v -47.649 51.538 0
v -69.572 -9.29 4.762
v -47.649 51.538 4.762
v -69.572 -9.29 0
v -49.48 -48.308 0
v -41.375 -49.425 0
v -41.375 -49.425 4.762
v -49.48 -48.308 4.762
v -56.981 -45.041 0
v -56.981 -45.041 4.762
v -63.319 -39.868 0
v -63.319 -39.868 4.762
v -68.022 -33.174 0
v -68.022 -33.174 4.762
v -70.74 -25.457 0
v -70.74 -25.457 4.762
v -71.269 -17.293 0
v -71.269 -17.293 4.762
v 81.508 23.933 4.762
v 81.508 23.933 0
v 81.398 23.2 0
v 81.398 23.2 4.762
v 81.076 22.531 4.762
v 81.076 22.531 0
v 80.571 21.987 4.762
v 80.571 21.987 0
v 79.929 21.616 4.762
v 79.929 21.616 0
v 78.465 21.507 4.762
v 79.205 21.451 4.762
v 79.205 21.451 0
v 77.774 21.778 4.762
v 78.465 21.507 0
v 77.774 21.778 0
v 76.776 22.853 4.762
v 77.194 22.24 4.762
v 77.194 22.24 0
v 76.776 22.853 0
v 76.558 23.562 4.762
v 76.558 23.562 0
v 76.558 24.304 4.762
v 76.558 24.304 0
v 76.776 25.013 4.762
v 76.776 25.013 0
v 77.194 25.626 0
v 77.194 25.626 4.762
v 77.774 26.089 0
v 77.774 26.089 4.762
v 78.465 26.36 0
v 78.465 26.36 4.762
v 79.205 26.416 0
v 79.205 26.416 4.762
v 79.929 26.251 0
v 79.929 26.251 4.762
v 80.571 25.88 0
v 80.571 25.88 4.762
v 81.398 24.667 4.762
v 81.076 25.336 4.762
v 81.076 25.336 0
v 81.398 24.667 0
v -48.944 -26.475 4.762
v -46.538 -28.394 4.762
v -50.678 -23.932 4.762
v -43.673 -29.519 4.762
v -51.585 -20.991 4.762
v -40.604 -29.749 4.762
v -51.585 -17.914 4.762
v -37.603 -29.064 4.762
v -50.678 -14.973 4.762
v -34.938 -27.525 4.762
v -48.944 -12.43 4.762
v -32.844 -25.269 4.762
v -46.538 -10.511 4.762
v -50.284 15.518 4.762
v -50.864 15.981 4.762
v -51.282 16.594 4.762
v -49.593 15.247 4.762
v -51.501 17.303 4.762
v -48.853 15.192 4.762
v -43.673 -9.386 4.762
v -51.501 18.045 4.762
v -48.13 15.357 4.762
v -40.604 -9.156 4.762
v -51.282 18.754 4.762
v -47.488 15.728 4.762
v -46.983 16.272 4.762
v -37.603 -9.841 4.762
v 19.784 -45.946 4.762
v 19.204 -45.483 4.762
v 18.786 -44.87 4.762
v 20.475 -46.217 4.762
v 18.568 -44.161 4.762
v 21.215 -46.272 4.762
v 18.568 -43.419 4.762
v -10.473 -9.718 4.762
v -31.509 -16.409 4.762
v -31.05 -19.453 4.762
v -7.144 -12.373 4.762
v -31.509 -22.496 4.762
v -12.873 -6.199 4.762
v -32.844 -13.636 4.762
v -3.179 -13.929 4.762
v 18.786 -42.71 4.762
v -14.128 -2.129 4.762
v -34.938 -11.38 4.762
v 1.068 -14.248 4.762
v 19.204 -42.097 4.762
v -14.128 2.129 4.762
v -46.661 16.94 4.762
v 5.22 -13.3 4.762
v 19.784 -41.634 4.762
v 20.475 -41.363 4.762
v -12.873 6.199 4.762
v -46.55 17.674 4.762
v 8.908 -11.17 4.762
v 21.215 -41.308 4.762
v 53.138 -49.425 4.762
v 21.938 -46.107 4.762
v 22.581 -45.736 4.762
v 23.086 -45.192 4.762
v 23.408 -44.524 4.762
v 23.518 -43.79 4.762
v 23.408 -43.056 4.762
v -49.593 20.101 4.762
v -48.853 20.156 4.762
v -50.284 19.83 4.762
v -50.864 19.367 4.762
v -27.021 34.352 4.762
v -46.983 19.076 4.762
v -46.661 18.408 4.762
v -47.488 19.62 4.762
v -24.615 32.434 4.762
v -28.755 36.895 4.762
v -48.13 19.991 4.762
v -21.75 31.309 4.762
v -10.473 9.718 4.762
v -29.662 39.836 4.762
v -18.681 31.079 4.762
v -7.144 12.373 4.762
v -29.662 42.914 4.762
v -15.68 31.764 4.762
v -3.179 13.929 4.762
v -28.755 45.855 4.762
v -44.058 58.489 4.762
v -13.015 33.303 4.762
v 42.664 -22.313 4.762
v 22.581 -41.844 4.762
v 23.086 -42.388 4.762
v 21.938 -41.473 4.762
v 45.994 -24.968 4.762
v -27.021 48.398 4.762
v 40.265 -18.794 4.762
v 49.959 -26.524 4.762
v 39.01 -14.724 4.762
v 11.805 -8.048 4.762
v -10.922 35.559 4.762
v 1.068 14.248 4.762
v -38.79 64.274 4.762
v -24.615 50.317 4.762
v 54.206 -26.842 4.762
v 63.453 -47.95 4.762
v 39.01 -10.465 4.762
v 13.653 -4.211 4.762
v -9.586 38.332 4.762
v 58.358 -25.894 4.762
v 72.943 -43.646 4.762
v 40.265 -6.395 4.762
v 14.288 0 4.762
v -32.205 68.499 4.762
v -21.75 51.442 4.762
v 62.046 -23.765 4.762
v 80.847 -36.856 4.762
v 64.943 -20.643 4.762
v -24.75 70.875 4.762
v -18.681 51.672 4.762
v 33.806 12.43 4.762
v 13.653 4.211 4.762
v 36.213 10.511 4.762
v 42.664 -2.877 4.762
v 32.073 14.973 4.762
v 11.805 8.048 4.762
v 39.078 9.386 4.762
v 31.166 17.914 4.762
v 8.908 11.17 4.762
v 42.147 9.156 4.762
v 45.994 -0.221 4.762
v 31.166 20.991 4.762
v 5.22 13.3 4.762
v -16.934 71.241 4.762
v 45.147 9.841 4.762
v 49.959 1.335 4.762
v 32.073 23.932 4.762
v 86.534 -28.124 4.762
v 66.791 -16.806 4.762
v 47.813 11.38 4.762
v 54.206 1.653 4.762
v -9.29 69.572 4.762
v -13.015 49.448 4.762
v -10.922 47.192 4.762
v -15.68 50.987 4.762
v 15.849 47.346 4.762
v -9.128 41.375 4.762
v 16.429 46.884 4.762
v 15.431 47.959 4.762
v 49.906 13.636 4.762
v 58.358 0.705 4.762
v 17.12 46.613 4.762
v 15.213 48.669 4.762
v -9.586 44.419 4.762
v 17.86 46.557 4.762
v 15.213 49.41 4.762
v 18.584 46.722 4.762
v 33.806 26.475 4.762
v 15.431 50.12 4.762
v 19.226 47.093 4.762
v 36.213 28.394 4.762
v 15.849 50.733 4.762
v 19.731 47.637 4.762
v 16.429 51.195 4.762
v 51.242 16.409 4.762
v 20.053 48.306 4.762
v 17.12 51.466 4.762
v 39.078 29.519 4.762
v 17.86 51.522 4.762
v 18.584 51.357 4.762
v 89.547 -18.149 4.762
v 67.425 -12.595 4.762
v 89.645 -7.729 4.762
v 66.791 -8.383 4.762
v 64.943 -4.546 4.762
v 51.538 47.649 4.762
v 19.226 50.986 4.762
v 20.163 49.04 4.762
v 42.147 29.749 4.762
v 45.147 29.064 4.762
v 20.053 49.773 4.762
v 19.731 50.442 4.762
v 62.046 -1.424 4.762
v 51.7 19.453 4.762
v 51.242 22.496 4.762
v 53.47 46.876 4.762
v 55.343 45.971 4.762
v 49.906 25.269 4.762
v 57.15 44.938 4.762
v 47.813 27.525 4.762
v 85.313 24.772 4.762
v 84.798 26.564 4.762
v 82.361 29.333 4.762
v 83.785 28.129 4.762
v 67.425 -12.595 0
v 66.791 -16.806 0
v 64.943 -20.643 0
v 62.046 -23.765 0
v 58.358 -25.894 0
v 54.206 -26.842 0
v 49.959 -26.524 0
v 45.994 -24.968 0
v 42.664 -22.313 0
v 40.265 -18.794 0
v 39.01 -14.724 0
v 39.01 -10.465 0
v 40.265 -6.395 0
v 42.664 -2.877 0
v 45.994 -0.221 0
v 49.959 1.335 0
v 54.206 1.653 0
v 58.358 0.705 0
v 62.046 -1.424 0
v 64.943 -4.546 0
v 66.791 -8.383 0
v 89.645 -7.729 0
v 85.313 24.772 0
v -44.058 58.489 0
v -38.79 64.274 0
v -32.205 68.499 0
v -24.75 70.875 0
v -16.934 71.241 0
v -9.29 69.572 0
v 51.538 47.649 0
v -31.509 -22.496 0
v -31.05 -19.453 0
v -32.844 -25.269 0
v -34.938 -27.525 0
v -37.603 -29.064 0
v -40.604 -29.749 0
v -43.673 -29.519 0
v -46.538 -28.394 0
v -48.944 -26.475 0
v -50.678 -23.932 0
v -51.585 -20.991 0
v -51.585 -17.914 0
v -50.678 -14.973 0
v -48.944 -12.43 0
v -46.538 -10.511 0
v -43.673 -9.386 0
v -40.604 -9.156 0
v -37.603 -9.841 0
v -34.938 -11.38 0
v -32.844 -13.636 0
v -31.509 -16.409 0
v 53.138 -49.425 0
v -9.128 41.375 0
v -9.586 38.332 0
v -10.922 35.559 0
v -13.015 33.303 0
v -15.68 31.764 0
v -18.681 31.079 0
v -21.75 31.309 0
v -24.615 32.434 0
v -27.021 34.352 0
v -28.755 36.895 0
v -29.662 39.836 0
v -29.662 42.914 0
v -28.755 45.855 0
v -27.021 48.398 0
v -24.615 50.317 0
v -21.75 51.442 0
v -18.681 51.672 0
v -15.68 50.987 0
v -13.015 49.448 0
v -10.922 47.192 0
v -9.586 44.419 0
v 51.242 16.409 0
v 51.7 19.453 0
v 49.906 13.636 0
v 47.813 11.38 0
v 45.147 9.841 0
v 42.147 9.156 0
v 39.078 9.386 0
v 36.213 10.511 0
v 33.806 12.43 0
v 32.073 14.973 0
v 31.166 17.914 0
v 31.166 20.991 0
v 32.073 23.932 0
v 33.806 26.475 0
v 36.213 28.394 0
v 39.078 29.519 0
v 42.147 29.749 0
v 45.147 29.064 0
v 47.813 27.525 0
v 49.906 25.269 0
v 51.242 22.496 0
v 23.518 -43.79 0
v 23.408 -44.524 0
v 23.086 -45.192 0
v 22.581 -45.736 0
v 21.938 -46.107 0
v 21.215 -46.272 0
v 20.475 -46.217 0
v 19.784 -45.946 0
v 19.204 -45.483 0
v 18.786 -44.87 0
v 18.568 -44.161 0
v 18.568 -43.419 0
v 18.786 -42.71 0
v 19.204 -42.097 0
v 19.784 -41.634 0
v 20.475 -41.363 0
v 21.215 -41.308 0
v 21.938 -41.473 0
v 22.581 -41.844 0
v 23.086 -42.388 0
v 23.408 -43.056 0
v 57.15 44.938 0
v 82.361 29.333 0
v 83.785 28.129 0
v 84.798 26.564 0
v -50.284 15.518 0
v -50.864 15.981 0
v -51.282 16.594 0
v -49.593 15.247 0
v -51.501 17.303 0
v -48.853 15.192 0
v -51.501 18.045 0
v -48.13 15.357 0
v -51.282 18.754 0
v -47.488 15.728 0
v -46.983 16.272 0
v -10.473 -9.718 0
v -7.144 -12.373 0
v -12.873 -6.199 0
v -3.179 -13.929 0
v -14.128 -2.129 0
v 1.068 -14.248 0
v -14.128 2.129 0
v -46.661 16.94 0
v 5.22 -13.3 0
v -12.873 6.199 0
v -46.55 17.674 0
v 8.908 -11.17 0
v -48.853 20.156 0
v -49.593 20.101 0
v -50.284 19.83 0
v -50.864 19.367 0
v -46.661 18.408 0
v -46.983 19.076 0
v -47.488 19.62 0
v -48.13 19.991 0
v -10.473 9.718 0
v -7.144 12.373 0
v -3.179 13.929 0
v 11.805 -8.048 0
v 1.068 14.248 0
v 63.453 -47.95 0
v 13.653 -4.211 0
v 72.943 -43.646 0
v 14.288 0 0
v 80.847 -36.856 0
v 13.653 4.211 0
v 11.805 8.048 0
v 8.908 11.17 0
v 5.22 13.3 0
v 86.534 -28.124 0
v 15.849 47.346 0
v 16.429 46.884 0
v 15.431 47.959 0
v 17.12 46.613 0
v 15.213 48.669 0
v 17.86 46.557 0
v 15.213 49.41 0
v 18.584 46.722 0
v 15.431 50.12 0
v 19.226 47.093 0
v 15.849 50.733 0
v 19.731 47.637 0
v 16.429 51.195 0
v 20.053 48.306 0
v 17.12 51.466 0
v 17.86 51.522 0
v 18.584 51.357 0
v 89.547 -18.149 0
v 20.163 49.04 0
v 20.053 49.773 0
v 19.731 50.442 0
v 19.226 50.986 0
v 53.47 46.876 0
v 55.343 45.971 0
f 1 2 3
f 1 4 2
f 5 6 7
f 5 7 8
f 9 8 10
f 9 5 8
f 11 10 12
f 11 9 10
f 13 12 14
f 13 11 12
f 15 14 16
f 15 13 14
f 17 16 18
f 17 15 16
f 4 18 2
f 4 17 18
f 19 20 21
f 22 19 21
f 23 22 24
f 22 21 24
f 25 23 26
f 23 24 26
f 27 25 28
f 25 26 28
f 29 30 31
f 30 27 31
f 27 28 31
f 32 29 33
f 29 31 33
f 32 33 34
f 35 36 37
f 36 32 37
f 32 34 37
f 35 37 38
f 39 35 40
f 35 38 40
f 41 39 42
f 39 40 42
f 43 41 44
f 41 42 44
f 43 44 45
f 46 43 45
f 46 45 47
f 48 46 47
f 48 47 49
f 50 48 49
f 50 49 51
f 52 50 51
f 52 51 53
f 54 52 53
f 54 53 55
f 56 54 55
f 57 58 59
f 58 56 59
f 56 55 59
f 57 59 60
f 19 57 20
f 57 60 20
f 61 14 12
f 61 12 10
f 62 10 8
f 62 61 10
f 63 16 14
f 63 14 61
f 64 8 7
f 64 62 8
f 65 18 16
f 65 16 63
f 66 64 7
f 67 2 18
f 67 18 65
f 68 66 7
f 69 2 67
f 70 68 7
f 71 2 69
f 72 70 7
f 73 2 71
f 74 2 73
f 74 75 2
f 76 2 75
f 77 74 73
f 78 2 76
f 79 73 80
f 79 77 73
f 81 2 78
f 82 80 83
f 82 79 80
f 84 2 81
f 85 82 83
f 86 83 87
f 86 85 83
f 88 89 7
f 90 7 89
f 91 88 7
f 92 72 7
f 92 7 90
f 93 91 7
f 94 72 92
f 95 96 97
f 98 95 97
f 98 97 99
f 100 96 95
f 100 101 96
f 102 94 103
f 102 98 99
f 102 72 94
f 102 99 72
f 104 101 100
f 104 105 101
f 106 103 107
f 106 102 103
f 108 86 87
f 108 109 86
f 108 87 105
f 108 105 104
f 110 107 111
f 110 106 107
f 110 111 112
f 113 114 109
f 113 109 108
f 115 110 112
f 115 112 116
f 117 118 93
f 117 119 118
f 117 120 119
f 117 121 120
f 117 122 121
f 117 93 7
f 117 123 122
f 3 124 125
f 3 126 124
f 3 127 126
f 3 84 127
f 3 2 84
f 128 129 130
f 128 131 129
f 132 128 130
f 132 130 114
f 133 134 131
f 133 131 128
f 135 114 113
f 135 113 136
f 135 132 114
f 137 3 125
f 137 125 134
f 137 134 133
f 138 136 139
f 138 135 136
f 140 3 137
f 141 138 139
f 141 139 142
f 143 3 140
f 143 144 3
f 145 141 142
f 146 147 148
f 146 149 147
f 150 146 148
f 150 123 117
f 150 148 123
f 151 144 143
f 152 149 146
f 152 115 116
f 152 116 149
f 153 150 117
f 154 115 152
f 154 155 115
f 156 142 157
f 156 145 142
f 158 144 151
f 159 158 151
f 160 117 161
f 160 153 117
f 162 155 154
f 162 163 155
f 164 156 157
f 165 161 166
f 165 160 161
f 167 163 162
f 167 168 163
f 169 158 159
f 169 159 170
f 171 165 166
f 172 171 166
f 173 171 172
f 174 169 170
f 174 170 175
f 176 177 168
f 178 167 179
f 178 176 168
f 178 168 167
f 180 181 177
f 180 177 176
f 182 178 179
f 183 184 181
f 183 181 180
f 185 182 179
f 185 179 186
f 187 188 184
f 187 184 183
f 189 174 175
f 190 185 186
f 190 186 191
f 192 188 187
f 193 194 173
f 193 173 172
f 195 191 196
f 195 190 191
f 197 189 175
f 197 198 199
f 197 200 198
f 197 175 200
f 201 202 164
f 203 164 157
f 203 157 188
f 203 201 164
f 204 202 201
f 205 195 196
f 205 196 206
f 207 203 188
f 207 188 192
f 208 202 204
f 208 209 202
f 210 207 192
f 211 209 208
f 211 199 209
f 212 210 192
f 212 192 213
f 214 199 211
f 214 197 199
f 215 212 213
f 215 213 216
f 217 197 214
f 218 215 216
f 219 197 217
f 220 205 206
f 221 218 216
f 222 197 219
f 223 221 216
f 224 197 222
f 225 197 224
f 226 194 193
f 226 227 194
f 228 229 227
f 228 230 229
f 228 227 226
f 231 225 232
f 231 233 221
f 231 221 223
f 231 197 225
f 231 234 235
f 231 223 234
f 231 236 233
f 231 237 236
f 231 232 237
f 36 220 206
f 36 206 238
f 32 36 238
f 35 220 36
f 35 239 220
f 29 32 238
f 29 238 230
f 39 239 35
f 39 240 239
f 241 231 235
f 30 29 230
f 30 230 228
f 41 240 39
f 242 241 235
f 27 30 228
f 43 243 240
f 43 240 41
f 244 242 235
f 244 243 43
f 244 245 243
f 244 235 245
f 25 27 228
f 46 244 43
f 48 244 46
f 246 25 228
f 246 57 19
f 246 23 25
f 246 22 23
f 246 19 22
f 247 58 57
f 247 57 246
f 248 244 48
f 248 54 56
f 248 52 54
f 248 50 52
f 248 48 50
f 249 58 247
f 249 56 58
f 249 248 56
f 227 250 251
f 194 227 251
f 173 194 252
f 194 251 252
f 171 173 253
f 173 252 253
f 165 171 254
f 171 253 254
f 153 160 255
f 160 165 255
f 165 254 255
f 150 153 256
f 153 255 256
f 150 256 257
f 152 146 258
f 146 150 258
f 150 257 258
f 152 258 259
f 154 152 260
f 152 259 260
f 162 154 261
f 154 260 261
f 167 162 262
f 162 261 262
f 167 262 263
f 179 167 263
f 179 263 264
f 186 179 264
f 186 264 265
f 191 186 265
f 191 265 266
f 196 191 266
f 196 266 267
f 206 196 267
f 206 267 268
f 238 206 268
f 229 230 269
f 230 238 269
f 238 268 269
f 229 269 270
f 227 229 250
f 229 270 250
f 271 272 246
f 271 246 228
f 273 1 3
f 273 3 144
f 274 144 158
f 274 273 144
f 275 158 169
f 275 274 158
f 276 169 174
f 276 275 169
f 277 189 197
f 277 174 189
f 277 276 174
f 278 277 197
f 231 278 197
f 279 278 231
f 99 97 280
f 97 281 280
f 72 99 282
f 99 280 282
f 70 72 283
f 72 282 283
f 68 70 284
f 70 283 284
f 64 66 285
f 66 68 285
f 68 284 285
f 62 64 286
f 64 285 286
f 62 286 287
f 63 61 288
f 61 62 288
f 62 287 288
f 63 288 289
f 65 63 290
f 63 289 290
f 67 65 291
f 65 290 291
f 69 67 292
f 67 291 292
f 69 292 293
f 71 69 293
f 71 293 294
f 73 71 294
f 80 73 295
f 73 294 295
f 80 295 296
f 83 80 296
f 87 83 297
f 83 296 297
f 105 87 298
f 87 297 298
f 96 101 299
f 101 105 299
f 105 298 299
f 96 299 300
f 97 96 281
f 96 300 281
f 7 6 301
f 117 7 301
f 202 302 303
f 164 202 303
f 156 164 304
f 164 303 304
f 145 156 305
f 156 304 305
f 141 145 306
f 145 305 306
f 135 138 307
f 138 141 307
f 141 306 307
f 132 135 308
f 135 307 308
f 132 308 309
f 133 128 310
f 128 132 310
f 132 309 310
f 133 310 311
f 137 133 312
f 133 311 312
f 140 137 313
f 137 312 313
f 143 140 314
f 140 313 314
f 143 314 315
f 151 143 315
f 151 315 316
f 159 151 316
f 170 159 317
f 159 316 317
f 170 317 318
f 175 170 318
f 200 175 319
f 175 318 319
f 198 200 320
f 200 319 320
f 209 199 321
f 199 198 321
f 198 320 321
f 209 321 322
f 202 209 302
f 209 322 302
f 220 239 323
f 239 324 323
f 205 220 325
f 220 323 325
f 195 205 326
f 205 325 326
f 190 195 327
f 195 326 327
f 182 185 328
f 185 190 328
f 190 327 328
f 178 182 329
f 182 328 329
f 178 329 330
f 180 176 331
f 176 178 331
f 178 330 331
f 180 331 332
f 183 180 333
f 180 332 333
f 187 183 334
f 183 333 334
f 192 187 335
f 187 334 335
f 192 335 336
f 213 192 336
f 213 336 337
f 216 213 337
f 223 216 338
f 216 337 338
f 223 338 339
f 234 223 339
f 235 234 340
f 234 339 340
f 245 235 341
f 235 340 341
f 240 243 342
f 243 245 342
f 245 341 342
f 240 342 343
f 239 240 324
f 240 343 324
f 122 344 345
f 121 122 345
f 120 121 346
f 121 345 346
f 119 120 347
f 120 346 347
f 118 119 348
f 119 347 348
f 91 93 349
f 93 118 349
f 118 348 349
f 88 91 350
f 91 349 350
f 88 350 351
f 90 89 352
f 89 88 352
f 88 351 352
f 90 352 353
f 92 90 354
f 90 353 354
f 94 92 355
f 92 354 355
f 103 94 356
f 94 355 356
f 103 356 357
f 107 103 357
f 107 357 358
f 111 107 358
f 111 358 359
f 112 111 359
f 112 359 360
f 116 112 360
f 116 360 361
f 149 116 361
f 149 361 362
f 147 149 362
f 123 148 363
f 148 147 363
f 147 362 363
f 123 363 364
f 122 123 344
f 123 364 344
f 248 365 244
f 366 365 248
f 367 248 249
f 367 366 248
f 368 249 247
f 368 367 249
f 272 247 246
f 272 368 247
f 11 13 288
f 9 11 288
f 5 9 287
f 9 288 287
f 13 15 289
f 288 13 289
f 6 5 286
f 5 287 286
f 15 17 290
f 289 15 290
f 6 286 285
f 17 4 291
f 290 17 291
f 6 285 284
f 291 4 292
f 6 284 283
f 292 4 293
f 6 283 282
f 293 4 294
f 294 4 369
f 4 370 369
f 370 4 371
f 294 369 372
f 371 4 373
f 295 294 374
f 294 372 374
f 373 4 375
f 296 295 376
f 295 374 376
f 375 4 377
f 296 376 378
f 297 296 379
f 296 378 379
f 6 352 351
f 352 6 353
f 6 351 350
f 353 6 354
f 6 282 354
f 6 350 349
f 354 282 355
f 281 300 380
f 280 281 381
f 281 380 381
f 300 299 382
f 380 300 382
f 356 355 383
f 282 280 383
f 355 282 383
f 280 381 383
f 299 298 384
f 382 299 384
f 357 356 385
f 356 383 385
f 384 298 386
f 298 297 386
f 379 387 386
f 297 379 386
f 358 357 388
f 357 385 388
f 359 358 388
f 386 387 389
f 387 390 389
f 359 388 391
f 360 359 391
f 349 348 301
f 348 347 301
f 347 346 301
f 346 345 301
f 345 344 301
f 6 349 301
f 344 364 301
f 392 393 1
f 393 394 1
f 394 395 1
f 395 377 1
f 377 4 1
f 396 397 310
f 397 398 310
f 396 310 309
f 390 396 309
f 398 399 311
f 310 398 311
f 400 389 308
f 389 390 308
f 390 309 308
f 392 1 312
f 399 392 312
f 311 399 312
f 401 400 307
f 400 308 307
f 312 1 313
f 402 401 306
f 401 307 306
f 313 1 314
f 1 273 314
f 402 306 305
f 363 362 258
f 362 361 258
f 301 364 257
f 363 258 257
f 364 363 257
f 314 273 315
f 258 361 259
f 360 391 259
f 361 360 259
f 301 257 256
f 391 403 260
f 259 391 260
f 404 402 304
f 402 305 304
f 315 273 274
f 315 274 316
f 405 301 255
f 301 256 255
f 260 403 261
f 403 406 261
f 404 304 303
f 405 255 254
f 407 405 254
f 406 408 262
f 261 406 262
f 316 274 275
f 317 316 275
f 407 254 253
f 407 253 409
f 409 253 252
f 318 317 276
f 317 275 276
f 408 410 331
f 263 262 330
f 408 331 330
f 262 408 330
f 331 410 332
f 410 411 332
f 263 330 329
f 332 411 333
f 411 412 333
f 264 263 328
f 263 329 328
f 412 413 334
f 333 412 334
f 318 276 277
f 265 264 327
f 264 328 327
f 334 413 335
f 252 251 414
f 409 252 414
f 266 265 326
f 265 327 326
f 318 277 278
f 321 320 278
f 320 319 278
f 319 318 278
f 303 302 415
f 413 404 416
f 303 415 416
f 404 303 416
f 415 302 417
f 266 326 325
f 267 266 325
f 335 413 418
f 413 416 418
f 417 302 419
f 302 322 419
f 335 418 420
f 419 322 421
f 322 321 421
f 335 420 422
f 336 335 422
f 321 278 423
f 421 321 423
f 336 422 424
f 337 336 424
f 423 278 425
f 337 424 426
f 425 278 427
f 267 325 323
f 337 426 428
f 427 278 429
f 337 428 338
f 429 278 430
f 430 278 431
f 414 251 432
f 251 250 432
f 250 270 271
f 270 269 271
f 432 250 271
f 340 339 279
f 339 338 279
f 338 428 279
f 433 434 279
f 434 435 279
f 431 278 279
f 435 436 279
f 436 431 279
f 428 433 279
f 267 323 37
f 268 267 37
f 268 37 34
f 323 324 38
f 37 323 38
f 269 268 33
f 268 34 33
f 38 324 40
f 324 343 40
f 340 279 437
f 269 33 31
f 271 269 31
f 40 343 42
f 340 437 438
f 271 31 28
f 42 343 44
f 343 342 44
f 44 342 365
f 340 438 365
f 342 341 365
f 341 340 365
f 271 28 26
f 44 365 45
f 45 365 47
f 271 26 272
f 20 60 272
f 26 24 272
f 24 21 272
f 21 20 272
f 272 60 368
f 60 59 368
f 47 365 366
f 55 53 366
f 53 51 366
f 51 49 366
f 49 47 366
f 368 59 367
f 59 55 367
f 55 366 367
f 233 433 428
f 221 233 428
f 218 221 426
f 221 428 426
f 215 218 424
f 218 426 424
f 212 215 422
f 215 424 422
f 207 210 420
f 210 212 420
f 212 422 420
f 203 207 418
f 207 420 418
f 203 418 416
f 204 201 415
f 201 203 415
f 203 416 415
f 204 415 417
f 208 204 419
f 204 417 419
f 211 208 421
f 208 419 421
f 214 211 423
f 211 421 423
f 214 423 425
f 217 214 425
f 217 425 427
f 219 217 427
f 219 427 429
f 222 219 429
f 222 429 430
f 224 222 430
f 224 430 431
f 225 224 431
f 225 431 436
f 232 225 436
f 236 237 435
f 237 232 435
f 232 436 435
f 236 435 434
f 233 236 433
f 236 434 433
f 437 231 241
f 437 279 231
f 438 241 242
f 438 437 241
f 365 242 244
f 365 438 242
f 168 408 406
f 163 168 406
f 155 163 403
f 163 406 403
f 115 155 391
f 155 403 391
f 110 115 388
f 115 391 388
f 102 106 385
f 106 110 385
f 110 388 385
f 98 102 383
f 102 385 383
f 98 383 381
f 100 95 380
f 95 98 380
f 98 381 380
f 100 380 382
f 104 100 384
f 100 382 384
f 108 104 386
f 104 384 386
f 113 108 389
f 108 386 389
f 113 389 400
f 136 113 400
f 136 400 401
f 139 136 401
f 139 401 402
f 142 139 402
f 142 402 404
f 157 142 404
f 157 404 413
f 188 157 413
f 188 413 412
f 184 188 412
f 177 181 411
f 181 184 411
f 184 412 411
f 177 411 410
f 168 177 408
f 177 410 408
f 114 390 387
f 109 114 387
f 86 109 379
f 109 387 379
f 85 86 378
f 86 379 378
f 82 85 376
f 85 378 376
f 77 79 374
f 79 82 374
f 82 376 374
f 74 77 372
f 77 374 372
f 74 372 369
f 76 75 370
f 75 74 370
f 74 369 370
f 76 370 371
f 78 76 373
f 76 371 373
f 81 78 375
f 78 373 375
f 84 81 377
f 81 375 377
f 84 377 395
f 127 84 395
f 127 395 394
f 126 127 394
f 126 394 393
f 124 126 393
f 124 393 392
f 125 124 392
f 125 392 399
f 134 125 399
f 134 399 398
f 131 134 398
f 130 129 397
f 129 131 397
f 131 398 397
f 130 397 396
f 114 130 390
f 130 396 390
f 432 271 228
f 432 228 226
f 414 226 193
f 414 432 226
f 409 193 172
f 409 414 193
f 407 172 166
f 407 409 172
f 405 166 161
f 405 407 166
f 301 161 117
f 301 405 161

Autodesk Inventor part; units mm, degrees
ref_plane "YZ Plane" through (0, 0, 0) normal (1, 0, 0) x (0, 1, 0)
ref_plane "XZ Plane" through (0, 0, 0) normal (0, 1, 0) x (-1, 0, 0)
ref_plane "XY Plane" through (0, 0, 0) normal (0, 0, 1) x (1, 0, 0)
sketch "Sketch1" plane through (0, 0, 0) normal (0, 0, 1) x (1, 0, 0)
  circle A0 centre (0, 0) radius 38.1 construction
  circle A1 centre (-41.3753, -19.4526) radius 7.62 construction
  circle A2 centre (-19.4526, 41.3753) radius 7.62 construction
  circle A3 centre (41.3753, 19.4526) radius 7.62 construction
  circle A4 centre (-41.3753, -19.4526) radius 29.972 construction
  circle A5 centre (-19.4526, 41.3753) radius 29.972 construction
  circle A6 centre (41.3753, 19.4526) radius 29.972 construction
  line L0 (-31.2131, 8.7441) -> (-29.6148, 13.1787) construction
  line L1 (8.7441, 31.2131) -> (13.1787, 29.6148) construction
  circle A7 centre (0, 0) radius 19.05 construction
  circle A8 centre (53.1378, -12.5946) radius 35.56 construction
  circle A9 centre (53.1378, -12.5946) radius 14.2875
  circle A10 centre (41.3753, 19.4526) radius 10.3251
  line L2 (44.9329, 9.7597) -> (48.2149, 0.818) construction
  circle A11 centre (53.1378, -12.5946) radius 36.83 construction
  line L3 (-41.3753, -49.4246) -> (53.1378, -49.4246)
  circle A12 centre (-19.4526, 41.3753) radius 10.3251
  circle A13 centre (-41.3753, -19.4526) radius 10.3251
  circle A14 centre (21.029, -43.7899) radius 6.35 construction
  circle A15 centre (0, 0) radius 40.64 construction
  line L4 (-7.2269, -37.4083) -> (-7.7087, -39.9022) construction
  circle A16 centre (21.029, -43.7899) radius 2.4892
  line L5 (18.2801, -38.0657) -> (17.5929, -36.6347) construction
  line L6 (25.5834, -39.365) -> (26.722, -38.2588) construction
  circle A17 centre (-49.0395, 17.6741) radius 6.35 construction
  circle A18 centre (-49.0395, 17.6741) radius 2.4892
  circle A19 centre (17.6741, 49.0395) radius 6.35 construction
  circle A20 centre (17.6741, 49.0395) radius 2.4892
  circle A21 centre (79.0191, 23.9334) radius 2.4892
  circle A22 centre (79.0191, 23.9334) radius 6.35 construction
  line L7 (-47.7557, 11.4552) -> (-47.4347, 9.9005) construction
  line L8 (-44.0835, 21.6442) -> (-42.8445, 22.6367) construction
  line L9 (11.4552, 47.7557) -> (9.9005, 47.4347) construction
  line L10 (21.6442, 44.0835) -> (22.6367, 42.8445) construction
  line L11 (72.7136, 23.1828) -> (71.1372, 22.9952) construction
  line L12 (75.348, 18.7521) -> (74.4302, 17.4568) construction
  line L13 (-69.5719, -9.2903) -> (-47.6492, 51.5375)
  arc A23 (-69.5719, -9.2903) -> (-41.3753, -49.4246) centre (-41.3753, -19.4526) ccw
  line L14 (-9.2903, 69.5719) -> (51.5375, 47.6492)
  arc A24 (-9.2903, 69.5719) -> (-47.6492, 51.5375) centre (-19.4526, 41.3753) ccw
  line L15 (57.1496, 44.9377) -> (82.3611, 29.3328)
  line L16 (85.3134, 24.7723) -> (89.645, -7.7291)
  arc A25 (57.1496, 44.9377) -> (51.5375, 47.6492) centre (41.3753, 19.4526) ccw
  arc A26 (85.3134, 24.7723) -> (82.3611, 29.3328) centre (79.0191, 23.9334) ccw
  arc A27 (53.1378, -49.4246) -> (89.645, -7.7291) centre (53.1378, -12.5946) ccw
  circle A28 centre (0, 0) radius 14.2875
  dimension "d0" = 76.2
  dimension "d5" = 28.575
  dimension "d6" = 20.6502
  dimension "d1" = 15.24
  dimension "d2" = 59.944
  dimension "d3" = 38.1
  dimension "d4" = 71.12
  dimension "d8" = 9.525
  dimension "d9" = 73.66
  dimension "d10" = 2.54
  dimension "d12" = 12.7
  dimension "d13" = 4.9784
  dimension "d14" = 1.5875
  dimension "d15" = 12.7
  dimension "d16" = 4.9784
  dimension "d17" = 12.7
  dimension "d18" = 4.9784
  dimension "d19" = 12.7
  dimension "d20" = 4.9784
  dimension "d21" = 1.5875
  dimension "d22" = 1.5875
  dimension "d23" = 1.5875
  dimension "d24" = 1.5875
extrude "Extrusion1" add sketch "Sketch1" along normal blind 4.7625
properties part number "bottomplate_gearbox4" material "Aluminum 6061"
